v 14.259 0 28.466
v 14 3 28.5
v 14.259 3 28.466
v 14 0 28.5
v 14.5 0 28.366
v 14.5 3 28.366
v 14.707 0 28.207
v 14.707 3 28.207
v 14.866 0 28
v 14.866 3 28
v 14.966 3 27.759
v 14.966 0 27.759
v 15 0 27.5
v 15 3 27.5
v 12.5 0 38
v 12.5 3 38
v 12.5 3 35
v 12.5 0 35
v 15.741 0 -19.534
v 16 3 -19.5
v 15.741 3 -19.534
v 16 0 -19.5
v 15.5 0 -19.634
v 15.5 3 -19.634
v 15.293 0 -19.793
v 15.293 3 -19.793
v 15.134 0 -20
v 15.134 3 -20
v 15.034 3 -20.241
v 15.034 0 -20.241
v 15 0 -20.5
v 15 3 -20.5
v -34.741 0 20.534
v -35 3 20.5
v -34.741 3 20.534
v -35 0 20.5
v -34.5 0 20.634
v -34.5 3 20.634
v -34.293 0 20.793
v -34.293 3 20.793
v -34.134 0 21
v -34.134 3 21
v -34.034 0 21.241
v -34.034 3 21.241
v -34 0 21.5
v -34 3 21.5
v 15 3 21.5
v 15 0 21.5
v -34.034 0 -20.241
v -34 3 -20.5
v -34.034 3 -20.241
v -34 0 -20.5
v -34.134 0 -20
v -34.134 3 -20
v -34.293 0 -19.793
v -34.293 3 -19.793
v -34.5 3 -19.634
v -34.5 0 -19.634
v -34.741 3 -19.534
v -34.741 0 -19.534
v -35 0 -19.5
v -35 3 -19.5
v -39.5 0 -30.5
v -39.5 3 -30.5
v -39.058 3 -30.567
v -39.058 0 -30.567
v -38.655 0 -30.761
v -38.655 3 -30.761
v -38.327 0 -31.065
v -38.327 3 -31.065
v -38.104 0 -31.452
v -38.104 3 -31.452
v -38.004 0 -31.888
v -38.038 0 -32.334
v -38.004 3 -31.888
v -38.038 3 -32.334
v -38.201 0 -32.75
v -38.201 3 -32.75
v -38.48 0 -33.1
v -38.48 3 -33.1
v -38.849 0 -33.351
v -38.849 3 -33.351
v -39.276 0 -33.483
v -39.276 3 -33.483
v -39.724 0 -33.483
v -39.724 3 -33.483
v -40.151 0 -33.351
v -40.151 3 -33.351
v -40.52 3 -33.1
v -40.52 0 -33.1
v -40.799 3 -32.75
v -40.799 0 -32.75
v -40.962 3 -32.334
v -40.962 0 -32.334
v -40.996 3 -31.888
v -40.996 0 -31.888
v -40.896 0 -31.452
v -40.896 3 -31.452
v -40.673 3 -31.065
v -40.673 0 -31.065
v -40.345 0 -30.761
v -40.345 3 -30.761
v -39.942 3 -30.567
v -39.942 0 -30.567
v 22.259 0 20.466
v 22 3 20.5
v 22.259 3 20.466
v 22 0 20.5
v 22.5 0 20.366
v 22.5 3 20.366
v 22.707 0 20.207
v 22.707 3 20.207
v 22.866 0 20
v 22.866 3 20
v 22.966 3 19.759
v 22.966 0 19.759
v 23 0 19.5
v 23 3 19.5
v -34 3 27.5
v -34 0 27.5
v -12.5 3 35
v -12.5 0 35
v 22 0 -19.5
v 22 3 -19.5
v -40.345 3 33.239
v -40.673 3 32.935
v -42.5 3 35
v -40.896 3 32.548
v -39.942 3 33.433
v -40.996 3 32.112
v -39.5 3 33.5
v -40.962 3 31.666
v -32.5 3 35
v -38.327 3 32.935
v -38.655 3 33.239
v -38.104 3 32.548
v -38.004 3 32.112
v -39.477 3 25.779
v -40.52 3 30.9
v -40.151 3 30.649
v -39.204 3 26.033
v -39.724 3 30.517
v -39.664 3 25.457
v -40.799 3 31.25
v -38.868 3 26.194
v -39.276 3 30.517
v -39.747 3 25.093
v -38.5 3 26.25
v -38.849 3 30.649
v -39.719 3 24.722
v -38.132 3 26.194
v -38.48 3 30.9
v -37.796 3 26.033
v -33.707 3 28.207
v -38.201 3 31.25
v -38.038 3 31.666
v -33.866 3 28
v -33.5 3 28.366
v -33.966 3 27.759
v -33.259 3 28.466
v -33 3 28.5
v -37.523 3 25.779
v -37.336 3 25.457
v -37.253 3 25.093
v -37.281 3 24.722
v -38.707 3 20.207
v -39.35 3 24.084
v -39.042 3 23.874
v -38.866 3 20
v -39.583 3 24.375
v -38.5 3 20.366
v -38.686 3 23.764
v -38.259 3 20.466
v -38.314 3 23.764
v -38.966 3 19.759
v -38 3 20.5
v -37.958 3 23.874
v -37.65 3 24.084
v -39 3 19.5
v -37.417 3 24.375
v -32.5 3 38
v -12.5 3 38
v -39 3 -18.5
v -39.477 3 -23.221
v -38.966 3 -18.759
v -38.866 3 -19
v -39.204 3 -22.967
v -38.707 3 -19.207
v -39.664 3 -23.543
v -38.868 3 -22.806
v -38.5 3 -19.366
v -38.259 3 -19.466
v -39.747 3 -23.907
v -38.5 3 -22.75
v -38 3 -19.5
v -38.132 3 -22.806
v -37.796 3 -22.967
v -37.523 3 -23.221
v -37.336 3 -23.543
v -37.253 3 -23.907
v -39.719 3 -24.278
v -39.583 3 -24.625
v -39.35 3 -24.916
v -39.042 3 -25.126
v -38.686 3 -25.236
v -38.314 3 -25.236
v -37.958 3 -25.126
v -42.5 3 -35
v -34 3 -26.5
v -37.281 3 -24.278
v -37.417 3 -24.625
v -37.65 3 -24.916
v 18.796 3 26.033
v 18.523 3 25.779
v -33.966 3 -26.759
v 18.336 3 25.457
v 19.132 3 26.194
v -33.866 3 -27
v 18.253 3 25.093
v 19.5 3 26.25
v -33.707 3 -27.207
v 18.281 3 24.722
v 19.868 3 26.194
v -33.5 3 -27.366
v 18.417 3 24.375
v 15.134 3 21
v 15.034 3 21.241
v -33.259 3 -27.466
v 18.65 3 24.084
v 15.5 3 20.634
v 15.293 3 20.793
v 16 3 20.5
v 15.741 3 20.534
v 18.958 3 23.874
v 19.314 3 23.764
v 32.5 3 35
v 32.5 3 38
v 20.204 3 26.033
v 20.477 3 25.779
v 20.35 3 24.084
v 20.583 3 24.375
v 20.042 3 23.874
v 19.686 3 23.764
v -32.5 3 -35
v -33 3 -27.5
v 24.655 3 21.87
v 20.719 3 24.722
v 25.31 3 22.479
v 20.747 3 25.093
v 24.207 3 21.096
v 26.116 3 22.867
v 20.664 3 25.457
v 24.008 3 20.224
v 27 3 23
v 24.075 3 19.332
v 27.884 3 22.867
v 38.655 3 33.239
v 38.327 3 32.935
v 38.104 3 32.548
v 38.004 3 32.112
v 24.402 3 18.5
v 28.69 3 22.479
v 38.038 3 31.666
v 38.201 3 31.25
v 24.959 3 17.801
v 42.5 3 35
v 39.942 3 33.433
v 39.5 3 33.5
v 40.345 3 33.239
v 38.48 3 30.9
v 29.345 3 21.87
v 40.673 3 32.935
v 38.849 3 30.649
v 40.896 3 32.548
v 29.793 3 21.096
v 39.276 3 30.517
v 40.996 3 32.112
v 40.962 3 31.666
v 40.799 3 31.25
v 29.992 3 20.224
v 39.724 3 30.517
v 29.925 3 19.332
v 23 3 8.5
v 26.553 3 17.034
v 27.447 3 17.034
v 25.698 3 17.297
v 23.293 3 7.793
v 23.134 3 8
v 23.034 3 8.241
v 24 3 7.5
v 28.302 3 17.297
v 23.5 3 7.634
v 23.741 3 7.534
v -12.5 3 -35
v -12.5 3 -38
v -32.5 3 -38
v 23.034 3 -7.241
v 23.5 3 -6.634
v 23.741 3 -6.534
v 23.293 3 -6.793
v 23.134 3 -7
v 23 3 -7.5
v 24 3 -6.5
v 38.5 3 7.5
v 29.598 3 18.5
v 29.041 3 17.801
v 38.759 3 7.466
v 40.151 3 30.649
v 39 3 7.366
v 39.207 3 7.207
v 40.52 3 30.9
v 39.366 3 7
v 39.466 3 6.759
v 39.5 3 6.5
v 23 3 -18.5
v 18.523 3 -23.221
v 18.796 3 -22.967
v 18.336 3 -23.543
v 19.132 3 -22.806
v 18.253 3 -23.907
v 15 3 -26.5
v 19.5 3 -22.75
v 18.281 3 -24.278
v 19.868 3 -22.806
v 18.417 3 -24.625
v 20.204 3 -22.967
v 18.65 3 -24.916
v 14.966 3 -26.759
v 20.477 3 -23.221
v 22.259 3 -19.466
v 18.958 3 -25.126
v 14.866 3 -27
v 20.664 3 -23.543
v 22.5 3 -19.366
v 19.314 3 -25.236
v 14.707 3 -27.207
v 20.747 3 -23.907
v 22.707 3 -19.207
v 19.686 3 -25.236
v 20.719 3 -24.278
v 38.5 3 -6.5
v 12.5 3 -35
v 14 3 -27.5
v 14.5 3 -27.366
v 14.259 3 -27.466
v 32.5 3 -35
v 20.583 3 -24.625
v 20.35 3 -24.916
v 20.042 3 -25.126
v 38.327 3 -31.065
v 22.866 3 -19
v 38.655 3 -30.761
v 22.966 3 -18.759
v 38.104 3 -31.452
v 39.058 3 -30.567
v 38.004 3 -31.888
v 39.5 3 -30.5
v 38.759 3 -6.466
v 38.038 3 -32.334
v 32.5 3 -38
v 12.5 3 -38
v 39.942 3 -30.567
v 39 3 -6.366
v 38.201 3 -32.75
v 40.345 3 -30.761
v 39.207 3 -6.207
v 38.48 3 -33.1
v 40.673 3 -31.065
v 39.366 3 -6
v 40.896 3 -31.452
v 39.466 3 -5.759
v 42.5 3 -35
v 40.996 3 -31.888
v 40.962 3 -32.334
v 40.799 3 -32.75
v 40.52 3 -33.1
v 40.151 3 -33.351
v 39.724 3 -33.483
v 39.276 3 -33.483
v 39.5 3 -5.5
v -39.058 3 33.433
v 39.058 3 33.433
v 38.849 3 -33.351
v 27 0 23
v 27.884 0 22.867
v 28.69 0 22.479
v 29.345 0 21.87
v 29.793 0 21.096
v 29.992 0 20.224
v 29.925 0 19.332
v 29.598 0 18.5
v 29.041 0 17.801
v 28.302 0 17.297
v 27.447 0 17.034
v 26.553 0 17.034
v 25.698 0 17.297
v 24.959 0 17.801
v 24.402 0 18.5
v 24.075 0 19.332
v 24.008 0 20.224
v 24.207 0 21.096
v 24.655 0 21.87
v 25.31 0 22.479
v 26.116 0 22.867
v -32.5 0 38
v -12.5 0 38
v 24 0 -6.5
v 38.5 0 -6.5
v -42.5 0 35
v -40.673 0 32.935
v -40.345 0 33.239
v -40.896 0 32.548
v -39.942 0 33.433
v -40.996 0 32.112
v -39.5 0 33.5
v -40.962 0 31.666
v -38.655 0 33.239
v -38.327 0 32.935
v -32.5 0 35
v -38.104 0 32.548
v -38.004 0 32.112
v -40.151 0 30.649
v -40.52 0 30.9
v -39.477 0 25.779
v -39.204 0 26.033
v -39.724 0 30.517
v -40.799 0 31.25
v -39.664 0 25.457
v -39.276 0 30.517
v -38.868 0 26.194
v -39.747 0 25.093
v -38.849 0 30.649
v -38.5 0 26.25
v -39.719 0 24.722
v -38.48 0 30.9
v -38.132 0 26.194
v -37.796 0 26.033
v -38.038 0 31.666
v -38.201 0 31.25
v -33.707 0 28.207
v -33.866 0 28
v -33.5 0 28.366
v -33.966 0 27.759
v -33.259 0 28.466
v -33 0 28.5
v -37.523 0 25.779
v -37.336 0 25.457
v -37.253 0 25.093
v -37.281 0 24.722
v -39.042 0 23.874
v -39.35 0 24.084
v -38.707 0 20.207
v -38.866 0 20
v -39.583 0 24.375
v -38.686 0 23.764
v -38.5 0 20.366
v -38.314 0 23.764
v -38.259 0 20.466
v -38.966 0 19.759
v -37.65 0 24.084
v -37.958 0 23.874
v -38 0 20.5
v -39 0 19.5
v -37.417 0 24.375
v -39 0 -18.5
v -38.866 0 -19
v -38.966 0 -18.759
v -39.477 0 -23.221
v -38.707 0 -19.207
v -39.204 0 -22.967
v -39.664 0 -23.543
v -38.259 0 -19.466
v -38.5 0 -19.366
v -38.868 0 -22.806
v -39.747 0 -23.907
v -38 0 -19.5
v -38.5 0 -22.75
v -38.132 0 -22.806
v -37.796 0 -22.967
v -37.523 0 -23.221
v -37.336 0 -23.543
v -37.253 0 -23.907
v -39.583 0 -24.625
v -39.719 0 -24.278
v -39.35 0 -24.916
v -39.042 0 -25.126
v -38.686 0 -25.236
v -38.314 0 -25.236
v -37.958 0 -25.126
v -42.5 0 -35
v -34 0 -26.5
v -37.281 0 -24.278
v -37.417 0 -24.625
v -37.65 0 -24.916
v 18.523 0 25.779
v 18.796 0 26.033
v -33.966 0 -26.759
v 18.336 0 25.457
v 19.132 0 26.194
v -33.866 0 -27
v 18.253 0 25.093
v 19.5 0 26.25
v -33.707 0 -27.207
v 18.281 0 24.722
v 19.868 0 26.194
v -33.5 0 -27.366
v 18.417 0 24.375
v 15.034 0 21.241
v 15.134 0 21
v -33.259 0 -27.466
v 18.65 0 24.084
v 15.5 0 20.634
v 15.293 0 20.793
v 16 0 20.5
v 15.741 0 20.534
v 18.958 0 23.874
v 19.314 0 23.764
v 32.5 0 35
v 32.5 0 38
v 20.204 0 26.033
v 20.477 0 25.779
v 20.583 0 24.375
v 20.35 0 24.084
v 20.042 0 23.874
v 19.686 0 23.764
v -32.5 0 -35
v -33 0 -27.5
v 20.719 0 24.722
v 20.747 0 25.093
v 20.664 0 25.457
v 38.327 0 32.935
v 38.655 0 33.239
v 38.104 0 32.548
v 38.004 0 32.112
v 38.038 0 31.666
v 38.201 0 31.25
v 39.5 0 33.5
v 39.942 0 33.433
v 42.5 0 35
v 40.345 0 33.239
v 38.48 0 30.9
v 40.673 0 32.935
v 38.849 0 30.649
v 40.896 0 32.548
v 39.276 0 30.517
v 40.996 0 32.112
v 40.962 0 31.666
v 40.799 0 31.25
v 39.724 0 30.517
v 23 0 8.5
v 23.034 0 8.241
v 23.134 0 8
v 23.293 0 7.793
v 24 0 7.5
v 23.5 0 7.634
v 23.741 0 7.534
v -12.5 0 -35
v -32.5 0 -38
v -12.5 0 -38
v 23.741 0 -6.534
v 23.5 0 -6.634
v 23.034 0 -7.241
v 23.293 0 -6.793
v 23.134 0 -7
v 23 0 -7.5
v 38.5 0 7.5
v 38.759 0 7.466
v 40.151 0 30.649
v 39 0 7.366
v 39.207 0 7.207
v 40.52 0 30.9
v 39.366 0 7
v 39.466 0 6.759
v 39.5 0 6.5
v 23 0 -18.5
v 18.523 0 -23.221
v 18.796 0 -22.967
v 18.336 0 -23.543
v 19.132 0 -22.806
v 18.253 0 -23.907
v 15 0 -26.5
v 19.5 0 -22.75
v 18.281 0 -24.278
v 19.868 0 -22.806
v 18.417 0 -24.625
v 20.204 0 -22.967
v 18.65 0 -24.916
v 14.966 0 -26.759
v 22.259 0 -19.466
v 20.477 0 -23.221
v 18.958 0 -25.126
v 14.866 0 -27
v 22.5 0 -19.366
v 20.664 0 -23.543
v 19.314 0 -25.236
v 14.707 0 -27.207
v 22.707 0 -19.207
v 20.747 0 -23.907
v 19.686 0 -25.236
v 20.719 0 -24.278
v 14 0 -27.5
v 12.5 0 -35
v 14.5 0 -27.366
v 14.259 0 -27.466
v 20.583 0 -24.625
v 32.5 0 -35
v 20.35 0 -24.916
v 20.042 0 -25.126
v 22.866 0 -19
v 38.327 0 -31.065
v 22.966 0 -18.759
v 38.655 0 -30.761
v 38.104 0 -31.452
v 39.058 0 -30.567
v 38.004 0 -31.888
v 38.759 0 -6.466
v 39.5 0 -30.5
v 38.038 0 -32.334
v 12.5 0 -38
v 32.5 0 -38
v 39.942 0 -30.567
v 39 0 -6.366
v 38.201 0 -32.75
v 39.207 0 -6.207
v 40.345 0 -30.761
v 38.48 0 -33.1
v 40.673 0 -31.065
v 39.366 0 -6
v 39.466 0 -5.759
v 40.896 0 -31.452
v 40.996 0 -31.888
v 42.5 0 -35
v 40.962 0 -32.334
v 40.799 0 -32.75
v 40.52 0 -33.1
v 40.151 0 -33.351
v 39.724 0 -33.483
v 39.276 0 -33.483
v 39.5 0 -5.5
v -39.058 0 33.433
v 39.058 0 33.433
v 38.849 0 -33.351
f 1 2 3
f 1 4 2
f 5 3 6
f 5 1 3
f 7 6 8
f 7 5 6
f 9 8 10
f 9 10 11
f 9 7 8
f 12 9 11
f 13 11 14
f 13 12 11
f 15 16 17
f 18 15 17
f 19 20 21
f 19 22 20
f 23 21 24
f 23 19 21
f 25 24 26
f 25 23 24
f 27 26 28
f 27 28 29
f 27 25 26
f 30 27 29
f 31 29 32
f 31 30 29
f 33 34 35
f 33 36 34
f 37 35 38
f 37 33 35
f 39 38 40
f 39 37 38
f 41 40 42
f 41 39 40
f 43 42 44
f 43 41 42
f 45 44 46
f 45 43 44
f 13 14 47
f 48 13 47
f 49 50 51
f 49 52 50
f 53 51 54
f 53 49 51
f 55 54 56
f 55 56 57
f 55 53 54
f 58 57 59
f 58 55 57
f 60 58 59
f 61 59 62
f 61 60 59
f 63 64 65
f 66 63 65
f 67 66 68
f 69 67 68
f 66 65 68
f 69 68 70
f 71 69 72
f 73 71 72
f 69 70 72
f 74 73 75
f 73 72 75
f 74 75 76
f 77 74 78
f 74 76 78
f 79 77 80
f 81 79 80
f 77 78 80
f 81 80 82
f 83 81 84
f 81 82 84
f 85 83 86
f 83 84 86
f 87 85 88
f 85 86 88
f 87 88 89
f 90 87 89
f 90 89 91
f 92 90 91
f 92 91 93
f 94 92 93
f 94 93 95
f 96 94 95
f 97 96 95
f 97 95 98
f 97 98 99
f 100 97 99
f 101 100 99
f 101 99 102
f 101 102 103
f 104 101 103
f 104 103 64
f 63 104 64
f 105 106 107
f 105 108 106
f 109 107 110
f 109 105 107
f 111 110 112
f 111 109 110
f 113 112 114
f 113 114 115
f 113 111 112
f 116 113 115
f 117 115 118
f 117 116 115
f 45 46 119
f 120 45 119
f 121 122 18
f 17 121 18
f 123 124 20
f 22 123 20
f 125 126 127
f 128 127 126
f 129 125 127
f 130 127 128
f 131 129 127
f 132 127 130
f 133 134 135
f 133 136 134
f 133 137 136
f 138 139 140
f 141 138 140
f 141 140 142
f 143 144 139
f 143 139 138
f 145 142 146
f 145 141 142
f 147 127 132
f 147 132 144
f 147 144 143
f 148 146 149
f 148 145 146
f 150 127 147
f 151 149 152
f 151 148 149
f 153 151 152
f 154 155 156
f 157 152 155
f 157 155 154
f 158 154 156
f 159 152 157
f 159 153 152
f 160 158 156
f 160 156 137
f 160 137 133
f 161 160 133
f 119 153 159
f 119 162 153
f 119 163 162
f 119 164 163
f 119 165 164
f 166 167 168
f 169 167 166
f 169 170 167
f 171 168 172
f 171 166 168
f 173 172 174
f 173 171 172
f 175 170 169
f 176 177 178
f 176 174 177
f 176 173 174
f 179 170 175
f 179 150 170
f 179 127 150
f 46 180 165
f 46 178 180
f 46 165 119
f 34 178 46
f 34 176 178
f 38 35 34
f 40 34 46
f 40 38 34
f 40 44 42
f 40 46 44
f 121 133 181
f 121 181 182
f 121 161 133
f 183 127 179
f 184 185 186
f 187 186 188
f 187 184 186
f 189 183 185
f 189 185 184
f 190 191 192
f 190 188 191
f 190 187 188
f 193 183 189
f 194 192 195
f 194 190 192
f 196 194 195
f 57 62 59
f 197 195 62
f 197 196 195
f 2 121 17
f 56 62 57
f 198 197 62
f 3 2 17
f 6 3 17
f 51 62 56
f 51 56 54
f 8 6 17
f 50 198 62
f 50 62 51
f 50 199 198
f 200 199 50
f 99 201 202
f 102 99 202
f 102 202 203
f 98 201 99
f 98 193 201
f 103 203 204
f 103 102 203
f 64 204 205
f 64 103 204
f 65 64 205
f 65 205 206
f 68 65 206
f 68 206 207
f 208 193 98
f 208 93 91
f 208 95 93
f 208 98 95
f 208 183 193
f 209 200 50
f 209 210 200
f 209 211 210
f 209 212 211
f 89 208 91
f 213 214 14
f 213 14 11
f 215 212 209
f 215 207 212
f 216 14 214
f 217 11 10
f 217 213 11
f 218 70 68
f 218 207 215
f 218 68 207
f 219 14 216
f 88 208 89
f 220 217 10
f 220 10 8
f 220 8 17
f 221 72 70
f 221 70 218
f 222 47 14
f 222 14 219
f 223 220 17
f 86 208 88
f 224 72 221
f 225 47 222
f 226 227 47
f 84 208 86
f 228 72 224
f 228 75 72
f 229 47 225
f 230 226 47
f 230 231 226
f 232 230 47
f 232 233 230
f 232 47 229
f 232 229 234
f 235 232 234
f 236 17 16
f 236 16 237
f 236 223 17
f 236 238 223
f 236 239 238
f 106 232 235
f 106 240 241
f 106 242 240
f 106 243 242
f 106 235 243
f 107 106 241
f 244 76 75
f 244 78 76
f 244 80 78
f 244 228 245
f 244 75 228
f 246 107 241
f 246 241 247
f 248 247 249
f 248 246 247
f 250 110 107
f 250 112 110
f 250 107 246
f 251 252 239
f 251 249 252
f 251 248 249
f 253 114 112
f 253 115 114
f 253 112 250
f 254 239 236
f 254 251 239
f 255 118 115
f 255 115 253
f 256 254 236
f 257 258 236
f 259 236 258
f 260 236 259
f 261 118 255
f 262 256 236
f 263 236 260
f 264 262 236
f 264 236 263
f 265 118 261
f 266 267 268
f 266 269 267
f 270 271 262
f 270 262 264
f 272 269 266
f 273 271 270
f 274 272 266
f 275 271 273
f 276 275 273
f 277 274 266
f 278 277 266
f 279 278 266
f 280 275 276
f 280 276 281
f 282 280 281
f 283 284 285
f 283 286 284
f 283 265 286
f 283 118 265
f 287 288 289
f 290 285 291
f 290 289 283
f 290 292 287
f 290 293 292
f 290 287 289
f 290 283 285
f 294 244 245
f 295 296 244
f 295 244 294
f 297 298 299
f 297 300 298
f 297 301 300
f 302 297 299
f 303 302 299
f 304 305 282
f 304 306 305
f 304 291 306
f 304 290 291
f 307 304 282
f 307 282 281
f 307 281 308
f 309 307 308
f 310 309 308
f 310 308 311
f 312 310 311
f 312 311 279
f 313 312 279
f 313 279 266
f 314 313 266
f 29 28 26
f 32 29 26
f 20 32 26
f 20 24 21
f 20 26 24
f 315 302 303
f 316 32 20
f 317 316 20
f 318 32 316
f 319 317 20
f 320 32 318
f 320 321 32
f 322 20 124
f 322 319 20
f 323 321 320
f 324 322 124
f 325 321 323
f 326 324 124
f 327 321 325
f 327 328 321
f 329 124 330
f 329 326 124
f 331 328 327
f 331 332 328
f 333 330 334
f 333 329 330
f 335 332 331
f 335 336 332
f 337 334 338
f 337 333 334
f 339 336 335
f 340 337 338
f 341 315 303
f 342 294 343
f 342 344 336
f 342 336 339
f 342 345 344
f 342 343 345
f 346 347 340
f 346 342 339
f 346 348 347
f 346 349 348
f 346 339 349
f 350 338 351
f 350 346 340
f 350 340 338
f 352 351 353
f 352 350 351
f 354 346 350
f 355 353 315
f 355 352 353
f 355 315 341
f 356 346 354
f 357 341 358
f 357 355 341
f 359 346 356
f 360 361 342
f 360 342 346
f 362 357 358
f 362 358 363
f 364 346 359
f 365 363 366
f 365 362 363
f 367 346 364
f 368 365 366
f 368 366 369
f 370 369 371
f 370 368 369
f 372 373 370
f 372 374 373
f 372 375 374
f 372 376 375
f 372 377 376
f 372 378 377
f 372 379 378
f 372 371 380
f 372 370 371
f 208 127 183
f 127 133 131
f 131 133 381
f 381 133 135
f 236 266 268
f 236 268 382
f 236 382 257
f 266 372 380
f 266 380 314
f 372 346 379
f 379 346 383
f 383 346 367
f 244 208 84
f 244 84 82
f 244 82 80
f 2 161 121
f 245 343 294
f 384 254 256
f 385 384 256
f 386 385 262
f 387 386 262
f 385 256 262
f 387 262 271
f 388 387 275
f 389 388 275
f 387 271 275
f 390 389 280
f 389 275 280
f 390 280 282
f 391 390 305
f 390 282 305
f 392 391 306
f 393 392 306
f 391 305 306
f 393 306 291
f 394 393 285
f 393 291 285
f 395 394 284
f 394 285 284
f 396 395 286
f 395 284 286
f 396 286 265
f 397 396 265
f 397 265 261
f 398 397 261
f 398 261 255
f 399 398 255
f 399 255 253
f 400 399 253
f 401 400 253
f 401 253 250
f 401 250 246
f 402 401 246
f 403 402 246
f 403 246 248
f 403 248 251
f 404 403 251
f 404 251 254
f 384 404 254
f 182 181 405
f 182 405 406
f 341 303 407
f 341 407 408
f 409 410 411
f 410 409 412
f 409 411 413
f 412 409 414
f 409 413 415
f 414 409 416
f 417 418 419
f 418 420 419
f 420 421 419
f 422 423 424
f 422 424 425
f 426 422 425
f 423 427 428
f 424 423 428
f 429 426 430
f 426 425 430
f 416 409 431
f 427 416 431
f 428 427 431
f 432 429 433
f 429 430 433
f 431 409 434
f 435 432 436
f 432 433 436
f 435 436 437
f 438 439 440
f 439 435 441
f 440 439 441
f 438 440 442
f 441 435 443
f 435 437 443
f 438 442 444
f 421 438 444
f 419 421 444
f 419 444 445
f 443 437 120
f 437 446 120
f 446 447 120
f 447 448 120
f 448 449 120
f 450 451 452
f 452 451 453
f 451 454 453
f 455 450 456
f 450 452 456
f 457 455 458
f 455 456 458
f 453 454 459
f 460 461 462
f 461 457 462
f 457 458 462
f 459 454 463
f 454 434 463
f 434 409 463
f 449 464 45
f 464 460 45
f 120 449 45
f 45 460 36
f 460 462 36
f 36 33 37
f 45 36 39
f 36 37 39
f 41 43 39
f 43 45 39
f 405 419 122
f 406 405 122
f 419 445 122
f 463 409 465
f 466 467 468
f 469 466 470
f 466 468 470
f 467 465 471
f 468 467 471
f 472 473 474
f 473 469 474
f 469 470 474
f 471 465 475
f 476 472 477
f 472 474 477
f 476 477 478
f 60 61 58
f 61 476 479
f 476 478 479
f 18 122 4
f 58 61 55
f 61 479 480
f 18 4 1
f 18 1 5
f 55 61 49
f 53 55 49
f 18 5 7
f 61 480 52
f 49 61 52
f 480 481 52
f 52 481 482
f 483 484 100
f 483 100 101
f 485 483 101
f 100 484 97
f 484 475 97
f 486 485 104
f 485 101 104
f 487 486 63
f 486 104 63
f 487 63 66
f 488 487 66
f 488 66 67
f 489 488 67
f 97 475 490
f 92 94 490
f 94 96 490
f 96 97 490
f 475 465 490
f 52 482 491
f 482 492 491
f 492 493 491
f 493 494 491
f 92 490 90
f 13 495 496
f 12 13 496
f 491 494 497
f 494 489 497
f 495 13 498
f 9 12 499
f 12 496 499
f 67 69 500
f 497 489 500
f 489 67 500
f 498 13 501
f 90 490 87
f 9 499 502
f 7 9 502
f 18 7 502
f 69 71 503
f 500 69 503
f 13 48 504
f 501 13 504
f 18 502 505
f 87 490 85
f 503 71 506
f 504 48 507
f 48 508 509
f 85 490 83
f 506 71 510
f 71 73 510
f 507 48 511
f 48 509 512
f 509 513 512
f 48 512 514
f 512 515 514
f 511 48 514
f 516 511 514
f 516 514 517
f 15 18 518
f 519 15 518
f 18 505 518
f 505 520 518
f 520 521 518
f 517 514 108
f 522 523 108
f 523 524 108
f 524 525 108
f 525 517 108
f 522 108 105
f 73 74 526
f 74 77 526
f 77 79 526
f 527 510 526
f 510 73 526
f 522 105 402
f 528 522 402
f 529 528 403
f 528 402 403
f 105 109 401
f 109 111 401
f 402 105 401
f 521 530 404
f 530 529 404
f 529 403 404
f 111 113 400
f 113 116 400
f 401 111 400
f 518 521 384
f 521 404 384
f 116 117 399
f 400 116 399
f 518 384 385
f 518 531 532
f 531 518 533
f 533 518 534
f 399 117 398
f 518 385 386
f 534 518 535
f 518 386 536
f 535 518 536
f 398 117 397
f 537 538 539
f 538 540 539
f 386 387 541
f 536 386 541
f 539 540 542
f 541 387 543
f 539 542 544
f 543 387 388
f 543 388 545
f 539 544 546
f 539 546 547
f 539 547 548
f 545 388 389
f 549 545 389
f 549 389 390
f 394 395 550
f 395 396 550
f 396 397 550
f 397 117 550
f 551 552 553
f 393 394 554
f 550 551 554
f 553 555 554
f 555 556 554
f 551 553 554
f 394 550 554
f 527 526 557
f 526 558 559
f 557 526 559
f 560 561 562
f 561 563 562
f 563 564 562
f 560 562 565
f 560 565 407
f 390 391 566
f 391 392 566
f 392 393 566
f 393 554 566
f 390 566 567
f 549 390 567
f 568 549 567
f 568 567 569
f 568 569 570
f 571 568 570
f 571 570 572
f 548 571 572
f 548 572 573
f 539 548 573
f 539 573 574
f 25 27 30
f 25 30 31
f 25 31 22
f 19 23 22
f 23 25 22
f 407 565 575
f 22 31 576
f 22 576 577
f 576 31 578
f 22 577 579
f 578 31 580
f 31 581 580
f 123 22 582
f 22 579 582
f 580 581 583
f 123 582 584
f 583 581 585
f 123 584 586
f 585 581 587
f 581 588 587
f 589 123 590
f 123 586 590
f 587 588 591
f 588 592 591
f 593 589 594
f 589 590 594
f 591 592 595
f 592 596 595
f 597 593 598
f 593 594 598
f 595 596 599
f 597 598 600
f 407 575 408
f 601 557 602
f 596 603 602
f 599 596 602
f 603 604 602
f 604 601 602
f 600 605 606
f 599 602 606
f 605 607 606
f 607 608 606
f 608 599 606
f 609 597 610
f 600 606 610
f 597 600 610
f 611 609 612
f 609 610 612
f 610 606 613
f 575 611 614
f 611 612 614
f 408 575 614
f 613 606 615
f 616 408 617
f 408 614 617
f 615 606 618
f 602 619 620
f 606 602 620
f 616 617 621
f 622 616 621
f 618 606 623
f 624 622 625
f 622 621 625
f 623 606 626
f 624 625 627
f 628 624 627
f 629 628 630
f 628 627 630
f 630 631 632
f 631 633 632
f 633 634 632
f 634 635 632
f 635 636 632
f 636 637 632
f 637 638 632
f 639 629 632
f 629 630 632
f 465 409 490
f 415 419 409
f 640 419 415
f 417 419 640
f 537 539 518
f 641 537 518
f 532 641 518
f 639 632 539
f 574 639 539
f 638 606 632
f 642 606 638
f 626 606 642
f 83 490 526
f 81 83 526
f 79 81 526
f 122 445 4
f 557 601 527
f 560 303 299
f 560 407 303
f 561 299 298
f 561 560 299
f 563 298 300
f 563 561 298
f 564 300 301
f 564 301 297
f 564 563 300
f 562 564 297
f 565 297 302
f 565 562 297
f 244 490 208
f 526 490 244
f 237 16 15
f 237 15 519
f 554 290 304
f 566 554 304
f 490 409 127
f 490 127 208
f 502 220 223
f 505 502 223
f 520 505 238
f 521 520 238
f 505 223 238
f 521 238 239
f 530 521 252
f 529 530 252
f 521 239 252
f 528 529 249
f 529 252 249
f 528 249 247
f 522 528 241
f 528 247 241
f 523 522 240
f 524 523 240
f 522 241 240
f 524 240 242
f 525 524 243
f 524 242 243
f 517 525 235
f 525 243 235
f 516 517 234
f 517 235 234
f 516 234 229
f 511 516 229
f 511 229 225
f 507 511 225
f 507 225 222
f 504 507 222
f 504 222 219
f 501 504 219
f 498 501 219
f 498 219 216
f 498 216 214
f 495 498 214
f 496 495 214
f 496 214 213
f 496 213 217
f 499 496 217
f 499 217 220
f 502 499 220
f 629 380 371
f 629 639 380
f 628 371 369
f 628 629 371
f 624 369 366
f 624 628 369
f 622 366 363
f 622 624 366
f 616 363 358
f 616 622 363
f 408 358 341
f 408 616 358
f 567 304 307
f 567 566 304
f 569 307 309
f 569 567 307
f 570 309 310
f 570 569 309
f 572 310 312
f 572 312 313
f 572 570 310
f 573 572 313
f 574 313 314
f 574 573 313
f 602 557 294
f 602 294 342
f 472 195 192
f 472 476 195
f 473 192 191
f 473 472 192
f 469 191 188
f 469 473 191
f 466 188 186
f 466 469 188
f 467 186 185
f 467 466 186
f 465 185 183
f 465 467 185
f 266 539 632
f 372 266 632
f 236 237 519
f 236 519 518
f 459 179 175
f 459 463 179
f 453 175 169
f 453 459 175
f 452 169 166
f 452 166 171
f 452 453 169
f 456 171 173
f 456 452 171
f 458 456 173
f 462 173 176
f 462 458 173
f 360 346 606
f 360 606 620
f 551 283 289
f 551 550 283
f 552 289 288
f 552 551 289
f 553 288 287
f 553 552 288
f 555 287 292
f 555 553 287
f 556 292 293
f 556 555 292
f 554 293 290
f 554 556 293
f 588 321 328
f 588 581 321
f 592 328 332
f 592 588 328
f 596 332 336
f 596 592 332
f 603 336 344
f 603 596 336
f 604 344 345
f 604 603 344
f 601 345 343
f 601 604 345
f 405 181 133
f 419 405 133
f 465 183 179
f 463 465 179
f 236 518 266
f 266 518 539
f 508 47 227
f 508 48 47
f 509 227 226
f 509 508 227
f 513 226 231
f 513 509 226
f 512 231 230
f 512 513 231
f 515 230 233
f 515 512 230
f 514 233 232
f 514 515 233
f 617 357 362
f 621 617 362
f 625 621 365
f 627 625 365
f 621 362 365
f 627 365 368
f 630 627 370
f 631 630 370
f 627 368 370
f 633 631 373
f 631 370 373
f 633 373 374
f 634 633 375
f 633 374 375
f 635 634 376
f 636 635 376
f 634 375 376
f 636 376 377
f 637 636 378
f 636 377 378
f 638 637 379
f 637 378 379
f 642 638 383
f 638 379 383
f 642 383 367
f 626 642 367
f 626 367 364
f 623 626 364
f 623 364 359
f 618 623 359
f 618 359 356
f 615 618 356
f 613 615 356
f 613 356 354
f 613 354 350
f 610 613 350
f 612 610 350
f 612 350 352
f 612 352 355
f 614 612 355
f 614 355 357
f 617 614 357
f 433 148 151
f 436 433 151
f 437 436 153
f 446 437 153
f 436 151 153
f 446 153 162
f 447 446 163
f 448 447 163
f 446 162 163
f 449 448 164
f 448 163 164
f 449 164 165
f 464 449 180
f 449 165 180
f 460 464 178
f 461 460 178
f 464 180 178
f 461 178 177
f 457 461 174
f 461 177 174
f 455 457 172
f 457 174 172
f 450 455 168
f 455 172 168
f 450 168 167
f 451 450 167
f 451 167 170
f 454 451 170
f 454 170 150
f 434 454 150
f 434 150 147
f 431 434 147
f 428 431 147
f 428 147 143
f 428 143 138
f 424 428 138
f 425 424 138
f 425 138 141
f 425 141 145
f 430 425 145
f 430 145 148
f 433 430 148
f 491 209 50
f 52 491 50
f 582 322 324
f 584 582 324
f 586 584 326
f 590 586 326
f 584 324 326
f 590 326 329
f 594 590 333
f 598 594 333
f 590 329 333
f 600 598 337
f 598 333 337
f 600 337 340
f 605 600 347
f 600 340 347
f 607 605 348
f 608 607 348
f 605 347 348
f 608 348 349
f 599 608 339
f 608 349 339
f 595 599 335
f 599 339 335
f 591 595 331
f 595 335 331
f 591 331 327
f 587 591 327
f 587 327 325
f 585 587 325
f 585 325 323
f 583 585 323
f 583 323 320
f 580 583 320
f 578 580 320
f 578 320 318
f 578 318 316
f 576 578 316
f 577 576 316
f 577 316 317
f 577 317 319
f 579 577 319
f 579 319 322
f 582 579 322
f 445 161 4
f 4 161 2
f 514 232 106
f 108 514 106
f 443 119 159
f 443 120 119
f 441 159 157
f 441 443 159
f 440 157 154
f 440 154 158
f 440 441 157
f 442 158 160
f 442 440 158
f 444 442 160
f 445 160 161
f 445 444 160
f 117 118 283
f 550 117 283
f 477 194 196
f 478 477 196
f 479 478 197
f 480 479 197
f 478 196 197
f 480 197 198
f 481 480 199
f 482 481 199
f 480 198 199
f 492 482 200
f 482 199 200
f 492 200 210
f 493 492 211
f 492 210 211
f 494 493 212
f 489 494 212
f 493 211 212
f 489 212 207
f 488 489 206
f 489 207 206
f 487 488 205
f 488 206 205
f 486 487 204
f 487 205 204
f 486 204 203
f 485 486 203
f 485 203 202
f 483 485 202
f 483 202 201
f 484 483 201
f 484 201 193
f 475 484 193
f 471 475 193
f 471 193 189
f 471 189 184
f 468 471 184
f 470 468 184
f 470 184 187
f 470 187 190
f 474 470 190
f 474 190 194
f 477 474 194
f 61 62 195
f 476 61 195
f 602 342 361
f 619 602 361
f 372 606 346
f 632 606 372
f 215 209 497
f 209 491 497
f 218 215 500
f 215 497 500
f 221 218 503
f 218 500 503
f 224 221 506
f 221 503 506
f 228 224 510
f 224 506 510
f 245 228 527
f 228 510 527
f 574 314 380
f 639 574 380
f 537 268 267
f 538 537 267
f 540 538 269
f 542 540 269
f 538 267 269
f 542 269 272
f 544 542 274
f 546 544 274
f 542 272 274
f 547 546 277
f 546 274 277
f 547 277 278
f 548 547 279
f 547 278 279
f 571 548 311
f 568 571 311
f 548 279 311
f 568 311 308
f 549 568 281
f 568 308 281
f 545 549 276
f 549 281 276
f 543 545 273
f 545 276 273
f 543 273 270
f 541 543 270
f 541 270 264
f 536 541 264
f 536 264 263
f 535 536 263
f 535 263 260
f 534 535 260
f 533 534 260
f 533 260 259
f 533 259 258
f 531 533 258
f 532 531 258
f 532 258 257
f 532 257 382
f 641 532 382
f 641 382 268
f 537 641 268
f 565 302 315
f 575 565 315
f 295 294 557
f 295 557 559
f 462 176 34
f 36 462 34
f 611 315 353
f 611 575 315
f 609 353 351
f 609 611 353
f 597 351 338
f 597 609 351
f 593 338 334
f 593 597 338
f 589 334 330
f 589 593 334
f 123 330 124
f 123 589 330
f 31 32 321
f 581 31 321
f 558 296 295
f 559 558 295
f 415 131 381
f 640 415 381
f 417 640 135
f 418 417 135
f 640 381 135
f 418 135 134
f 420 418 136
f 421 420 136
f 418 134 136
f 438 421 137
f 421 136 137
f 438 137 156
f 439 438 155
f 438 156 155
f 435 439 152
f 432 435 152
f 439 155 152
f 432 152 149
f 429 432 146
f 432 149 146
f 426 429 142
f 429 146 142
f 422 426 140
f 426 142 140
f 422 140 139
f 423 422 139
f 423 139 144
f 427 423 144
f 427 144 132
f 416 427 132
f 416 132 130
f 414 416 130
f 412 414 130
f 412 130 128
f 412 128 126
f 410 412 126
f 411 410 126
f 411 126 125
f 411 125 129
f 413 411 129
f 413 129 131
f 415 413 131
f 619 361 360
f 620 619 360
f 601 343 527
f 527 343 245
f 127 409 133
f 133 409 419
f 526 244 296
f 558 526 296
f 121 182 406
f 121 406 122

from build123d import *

# Parameters (mm, degrees)
SKETCH1_W           = 85
SKETCH1_H           = 70
BOSS_EXTRUDE1_DEPTH = 3
SKETCH2_R           = 1.25
CUT_EXTRUDE1_DEPTH  = 56.138462075
SKETCH3_W           = 20
SKETCH3_H           = 3
BOSS_EXTRUDE2_DEPTH = 3
SKETCH4_R           = 1.5
CUT_EXTRUDE2_DEPTH  = 10
CUT_EXTRUDE3_DEPTH  = 10
FILLET1_R           = 1
SKETCH6_W           = 16.5
SKETCH6_H           = 14
CUT_EXTRUDE4_DEPTH  = 58.089841478
FILLET2_R           = 1
SKETCH11_R          = 3
CUT_EXTRUDE9_DEPTH  = 10


with BuildPart() as part:
    # Sketch1 → Boss-Extrude1 (new body)
    with BuildSketch(Plane(origin=(0, 0, 0), x_dir=(1, 0, 0), z_dir=(0, 1, 0))):
        Rectangle(SKETCH1_W, SKETCH1_H)
    extrude(amount=BOSS_EXTRUDE1_DEPTH)

    # Sketch2 → Cut-Extrude1 (cut, through all)
    with BuildSketch(Plane(origin=(0, 3, 0), x_dir=(1, 0, 0), z_dir=(0, 1, 0))):
        with Locations(Location((-38.5, 24, 0), (0, 0, 270))):
            Circle(SKETCH2_R)
        with Locations(Location((-38.5, -25, 0), (0, 0, 270))):
            Circle(SKETCH2_R)
        with Locations(Location((19.5, -25, 0), (0, 0, 270))):
            Circle(SKETCH2_R)
        with Locations(Location((19.5, 24, 0), (0, 0, 270))):
            Circle(SKETCH2_R)
    extrude(amount=-CUT_EXTRUDE1_DEPTH, mode=Mode.SUBTRACT)

    # Sketch3 → Boss-Extrude2 (add)
    with BuildSketch(Plane(origin=(0, 3, 0), x_dir=(1, 0, 0), z_dir=(0, 1, 0))):
        with Locations((-22.5, 36.5)):
            Rectangle(SKETCH3_W, SKETCH3_H)
        with Locations((22.5, 36.5)):
            Rectangle(SKETCH3_W, SKETCH3_H)
        with Locations((22.5, -36.5)):
            Rectangle(SKETCH3_W, SKETCH3_H)
        with Locations((-22.5, -36.5)):
            Rectangle(SKETCH3_W, SKETCH3_H)
    extrude(amount=-BOSS_EXTRUDE2_DEPTH)

    # Sketch4 → Cut-Extrude2 (cut)
    with BuildSketch(Plane(origin=(0, 3, 0), x_dir=(1, 0, 0), z_dir=(0, 1, 0))):
        with Locations(Location((-39.5, -32, 0), (0, 0, 270))):
            Circle(SKETCH4_R)
        with Locations(Location((39.5, -32, 0), (0, 0, 270))):
            Circle(SKETCH4_R)
        with Locations(Location((39.5, 32, 0), (0, 0, 270))):
            Circle(SKETCH4_R)
        with Locations(Location((-39.5, 32, 0), (0, 0, 270))):
            Circle(SKETCH4_R)
    extrude(amount=-CUT_EXTRUDE2_DEPTH, mode=Mode.SUBTRACT)

    # Sketch5 → Cut-Extrude3 (cut)
    with BuildSketch(Plane(origin=(0, 3, 0), x_dir=(1, 0, 0), z_dir=(0, 1, 0))):
        Polygon((-34, 27.5), (-34, 19.5), (-39, 19.5), (-39, -20.5), (-34, -20.5), (-34, -28.5), (15, -28.5), (15, -20.5), (23, -20.5), (23, 19.5), (15, 19.5), (15, 27.5), align=None)
    extrude(amount=-CUT_EXTRUDE3_DEPTH, mode=Mode.SUBTRACT)

    # Fillet1
    fillet1_edges = [part.edges().sort_by_distance(p)[0] for p in [
        (-34, 1.5, 20.5),
        (-39, 1.5, 20.5),
        (-39, 1.5, -19.5),
        (-34, 1.5, -19.5),
        (-34, 1.5, -27.5),
        (15, 1.5, -27.5),
        (15, 1.5, -19.5),
        (23, 1.5, -19.5),
        (23, 1.5, 20.5),
        (15, 1.5, 20.5),
        (15, 1.5, 28.5),
        (-34, 1.5, 28.5),
    ]]
    fillet(fillet1_edges, radius=FILLET1_R)

    # Sketch6 → Cut-Extrude4 (cut, through all)
    with BuildSketch(Plane(origin=(0, 3, 0), x_dir=(1, 0, 0), z_dir=(0, 1, 0))):
        with Locations((31.25, -0.5)):
            Rectangle(SKETCH6_W, SKETCH6_H)
    extrude(amount=-CUT_EXTRUDE4_DEPTH, mode=Mode.SUBTRACT)

    # Fillet2
    fillet2_edges = [part.edges().sort_by_distance(p)[0] for p in [
        (23, 1.5, 7.5),
        (23, 1.5, -6.5),
        (39.5, 1.5, -6.5),
        (39.5, 1.5, 7.5),
    ]]
    fillet(fillet2_edges, radius=FILLET2_R)

    # Sketch11 → Cut-Extrude9 (cut)
    with BuildSketch(Plane(origin=(0, 3, 0), x_dir=(1, 0, 0), z_dir=(0, 1, 0))):
        with Locations(Location((27, -20, 0), (0, 0, 270))):
            Circle(SKETCH11_R)
    extrude(amount=-CUT_EXTRUDE9_DEPTH, mode=Mode.SUBTRACT)


solid = part.part
